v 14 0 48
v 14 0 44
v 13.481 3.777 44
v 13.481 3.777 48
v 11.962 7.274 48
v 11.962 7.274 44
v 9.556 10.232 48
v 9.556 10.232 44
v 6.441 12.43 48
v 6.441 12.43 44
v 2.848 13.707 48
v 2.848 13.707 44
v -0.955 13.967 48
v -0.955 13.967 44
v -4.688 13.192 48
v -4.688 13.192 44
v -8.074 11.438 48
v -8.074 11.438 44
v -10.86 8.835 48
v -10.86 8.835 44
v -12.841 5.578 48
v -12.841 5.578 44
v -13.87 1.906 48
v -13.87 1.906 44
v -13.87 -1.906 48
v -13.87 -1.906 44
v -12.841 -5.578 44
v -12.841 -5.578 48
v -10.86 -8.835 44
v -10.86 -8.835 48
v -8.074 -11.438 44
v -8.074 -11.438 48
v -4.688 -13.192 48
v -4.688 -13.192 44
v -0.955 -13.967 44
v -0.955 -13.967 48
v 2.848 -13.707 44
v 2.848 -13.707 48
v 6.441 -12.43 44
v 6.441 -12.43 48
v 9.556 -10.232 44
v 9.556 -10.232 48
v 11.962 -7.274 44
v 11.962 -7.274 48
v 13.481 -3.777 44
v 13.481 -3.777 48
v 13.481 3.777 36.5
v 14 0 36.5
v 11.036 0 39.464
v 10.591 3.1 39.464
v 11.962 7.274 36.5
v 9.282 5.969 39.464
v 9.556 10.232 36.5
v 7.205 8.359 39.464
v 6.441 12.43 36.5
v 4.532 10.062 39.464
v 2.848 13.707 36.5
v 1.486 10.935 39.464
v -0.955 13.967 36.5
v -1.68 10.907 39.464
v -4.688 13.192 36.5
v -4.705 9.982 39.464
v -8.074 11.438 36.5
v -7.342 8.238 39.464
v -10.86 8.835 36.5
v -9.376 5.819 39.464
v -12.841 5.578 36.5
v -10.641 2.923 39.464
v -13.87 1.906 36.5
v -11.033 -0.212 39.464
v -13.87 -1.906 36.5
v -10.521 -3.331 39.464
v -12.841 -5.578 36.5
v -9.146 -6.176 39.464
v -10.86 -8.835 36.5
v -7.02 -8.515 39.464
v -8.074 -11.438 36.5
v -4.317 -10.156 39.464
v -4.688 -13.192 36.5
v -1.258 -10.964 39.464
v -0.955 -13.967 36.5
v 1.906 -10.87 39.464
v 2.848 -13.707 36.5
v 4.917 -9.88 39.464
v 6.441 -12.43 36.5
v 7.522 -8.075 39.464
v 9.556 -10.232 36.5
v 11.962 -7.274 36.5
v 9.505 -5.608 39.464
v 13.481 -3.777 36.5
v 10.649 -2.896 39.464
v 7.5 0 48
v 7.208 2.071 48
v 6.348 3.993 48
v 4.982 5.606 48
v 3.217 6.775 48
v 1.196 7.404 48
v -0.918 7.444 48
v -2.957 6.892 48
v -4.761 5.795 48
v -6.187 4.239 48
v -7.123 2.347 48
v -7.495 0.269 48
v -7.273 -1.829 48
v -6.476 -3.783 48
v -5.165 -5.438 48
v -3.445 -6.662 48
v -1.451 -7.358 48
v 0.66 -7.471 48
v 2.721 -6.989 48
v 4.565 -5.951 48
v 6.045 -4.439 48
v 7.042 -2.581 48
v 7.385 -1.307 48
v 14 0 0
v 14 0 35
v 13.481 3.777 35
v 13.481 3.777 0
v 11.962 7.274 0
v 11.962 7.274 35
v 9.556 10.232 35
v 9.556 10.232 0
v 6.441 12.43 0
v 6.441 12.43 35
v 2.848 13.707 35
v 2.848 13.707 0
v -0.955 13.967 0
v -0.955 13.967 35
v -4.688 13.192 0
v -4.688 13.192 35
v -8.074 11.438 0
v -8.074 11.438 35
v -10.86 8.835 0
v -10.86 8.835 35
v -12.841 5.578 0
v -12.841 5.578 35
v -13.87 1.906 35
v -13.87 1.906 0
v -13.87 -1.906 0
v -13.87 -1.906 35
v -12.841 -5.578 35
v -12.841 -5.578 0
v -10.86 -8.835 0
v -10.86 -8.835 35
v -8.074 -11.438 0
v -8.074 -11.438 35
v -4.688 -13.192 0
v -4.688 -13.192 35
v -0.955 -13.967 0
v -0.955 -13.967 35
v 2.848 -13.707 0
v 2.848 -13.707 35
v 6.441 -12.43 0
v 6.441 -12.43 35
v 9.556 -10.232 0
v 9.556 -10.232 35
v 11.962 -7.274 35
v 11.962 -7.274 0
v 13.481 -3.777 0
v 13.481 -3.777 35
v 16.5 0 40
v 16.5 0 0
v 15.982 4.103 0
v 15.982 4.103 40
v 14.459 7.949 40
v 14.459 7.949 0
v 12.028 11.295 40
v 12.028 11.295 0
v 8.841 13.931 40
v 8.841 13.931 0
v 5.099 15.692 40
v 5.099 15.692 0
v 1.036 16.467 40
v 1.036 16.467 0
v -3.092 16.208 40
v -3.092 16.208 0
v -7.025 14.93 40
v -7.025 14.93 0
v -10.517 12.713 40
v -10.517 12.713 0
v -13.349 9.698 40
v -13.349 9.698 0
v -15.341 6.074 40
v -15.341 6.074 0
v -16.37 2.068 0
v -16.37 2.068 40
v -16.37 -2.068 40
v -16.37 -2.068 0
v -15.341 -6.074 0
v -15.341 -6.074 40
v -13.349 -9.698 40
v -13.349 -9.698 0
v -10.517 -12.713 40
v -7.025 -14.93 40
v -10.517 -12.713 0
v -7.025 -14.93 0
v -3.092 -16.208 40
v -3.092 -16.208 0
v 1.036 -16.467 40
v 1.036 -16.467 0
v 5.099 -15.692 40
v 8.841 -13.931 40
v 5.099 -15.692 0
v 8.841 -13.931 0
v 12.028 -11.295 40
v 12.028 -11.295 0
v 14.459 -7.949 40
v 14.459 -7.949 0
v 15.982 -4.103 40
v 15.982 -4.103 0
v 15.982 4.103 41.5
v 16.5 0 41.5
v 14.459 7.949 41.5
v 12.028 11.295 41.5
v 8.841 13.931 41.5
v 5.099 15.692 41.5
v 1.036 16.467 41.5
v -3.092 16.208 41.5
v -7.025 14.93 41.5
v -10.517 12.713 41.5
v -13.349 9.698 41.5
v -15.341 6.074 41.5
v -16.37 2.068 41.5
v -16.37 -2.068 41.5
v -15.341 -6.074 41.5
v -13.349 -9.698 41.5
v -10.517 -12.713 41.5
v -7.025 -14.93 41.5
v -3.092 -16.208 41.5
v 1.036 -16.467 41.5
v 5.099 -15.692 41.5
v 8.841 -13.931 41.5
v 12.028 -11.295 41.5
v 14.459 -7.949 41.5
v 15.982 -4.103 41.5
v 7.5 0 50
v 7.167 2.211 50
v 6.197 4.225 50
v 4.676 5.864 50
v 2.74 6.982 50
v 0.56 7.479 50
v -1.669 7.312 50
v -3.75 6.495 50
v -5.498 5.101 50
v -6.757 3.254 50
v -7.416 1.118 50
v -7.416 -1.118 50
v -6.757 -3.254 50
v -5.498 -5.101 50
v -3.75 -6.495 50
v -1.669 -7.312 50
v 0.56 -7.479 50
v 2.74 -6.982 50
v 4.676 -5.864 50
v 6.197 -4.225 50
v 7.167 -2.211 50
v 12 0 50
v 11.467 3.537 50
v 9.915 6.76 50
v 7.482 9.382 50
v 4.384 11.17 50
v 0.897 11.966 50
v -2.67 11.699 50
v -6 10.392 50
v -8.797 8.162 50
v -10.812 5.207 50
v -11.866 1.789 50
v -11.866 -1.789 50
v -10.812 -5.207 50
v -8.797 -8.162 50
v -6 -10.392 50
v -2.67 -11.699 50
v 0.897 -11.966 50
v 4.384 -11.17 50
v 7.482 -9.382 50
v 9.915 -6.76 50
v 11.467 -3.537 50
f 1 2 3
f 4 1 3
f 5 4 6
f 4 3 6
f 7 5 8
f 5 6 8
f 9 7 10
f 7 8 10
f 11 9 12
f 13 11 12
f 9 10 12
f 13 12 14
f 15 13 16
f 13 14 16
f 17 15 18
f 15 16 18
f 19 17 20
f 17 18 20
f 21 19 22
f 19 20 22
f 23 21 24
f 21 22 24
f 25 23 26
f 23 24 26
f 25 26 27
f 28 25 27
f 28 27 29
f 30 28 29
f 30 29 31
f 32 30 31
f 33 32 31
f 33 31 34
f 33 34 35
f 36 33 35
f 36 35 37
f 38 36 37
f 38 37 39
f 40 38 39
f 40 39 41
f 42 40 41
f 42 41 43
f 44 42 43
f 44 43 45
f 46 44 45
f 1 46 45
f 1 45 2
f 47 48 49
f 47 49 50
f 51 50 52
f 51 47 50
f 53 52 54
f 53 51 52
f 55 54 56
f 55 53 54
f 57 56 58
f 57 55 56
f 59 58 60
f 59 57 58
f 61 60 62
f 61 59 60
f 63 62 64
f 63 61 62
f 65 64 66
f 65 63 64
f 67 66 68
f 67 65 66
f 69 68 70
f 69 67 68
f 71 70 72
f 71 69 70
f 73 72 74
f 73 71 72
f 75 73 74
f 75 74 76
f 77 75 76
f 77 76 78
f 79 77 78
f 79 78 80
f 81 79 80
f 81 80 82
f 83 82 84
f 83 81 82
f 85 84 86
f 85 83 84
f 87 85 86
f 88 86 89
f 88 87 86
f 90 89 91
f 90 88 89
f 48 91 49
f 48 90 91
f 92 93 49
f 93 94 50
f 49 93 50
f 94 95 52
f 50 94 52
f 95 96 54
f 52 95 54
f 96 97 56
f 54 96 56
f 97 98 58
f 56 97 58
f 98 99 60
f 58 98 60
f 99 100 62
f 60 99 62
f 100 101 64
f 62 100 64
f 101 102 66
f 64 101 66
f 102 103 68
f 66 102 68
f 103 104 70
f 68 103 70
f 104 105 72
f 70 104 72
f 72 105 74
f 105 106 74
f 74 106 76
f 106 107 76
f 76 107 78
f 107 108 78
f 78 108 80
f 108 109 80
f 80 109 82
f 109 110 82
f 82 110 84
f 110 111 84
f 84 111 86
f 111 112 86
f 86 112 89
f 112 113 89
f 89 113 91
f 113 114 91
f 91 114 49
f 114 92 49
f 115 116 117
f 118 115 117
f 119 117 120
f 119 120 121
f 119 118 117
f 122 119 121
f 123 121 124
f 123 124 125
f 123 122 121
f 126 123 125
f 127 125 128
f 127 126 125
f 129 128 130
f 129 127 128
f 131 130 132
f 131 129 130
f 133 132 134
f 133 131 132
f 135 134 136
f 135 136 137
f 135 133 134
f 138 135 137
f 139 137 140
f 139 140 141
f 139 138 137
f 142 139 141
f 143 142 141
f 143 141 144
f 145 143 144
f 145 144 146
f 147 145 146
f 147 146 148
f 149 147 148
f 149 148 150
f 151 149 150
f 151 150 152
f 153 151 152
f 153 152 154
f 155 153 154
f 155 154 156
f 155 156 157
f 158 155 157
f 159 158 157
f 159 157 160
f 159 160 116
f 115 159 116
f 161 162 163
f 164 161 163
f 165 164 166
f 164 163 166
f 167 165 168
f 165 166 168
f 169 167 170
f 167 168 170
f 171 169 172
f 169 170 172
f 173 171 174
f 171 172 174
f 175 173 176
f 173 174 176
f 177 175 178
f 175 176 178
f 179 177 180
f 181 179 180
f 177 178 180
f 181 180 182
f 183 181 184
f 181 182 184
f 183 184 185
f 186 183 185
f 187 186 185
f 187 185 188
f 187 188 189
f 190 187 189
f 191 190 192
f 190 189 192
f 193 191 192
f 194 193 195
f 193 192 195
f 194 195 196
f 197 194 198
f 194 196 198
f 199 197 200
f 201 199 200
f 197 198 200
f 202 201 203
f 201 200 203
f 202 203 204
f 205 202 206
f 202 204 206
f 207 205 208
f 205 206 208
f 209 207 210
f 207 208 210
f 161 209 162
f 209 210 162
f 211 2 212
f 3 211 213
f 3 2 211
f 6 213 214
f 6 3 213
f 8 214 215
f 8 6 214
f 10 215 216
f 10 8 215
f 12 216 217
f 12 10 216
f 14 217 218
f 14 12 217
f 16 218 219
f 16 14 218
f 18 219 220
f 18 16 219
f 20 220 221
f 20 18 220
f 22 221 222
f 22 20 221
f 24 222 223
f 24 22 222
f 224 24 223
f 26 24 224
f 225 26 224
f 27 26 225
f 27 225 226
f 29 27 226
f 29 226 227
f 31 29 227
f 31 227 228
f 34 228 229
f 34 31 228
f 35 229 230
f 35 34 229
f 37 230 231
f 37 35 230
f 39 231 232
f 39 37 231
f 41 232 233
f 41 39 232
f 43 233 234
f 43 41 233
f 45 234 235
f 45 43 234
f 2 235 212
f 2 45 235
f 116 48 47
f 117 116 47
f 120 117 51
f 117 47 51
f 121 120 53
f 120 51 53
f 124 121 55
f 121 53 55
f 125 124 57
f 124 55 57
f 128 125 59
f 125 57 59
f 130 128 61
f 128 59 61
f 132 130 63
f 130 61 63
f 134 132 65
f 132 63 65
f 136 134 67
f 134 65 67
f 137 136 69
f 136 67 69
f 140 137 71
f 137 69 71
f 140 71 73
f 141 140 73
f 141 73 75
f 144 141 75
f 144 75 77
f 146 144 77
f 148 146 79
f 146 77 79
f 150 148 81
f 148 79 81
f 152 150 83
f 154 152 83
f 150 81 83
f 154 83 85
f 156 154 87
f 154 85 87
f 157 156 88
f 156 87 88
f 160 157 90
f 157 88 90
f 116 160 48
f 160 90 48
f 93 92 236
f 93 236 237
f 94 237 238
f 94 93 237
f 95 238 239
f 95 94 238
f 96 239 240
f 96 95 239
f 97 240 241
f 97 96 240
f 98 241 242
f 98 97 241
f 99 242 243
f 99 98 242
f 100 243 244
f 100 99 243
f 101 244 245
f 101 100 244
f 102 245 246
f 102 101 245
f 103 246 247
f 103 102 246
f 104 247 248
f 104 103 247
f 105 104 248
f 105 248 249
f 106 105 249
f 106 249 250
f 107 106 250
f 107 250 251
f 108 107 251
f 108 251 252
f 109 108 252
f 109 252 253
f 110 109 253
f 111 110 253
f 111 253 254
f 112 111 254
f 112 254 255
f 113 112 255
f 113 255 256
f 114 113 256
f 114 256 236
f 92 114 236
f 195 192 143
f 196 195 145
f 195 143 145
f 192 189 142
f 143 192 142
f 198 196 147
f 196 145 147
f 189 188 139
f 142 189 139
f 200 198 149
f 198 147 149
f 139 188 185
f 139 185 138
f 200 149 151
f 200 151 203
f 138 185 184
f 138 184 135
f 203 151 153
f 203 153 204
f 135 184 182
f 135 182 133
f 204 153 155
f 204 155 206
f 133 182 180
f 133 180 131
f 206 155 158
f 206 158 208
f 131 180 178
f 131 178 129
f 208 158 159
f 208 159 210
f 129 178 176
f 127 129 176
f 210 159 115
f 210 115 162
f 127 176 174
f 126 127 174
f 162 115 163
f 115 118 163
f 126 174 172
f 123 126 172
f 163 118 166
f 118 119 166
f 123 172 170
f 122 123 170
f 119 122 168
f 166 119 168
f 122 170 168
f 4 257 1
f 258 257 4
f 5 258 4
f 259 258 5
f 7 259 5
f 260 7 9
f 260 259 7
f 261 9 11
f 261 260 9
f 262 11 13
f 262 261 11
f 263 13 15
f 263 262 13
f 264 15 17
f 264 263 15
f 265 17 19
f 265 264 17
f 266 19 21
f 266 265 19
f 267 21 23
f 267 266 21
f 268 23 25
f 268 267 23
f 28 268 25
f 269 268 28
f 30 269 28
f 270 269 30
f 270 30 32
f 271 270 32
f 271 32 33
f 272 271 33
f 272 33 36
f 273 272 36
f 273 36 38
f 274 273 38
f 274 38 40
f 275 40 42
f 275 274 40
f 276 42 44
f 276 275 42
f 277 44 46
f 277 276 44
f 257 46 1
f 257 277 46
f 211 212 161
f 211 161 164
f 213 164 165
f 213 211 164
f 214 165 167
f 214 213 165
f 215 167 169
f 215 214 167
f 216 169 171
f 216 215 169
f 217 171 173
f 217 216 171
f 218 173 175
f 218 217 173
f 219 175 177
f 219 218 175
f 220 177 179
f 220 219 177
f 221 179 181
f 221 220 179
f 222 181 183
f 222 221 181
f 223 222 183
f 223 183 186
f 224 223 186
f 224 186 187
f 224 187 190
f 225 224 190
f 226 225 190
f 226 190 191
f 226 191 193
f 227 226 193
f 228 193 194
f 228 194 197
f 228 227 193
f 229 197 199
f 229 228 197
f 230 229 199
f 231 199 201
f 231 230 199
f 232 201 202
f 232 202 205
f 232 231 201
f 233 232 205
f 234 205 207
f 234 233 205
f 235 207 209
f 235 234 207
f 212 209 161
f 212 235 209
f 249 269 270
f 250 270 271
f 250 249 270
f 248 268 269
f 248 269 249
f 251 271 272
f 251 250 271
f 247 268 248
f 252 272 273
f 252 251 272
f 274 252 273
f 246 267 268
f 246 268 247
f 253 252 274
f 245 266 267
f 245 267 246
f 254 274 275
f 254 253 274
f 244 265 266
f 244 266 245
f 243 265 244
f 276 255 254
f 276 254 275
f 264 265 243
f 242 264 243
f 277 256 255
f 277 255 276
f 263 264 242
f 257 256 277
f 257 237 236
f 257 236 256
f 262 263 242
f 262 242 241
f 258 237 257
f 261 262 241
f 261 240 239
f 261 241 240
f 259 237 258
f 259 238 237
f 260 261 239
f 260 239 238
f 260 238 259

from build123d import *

# Parameters (mm, degrees)
F0_R          = 16.5
F0_R_2        = 14
F1_DEPTH      = 40
F2_R          = 14
F2_R_2        = 7.5
F3_DEPTH      = 10
F3_DEPTH_BACK = 5
F4_S5_R       = 16.5
F4_T6_DEPTH   = 27
F5_SIZE       = 2
F6_S5_R       = 14
F6_T6_DEPTH   = 24
F7_SIZE       = 5


# Not quite as in the source:
# - a fillet or chamfer that OpenCascade refuses, or shapes differently, is made with other operations: its cross-section is extruded or revolved along the edge and cut away or added


with BuildPart() as f1:
    # F0 (on Top) → F1 (new body)
    with BuildSketch(Plane.XY):
        Circle(F0_R)
        Circle(F0_R_2, mode=Mode.SUBTRACT)
    extrude(amount=F1_DEPTH)

    # F2 (on face) → F3 (join, two sides)
    with BuildSketch(Plane.XY.offset(40)) as f3_sk:
        Circle(F2_R)
        Circle(F2_R_2, mode=Mode.SUBTRACT)
    extrude(amount=F3_DEPTH)
    extrude(f3_sk.sketch, amount=-F3_DEPTH_BACK)

    # F4: chamfer of 4 on 1 edges, made by hand


with BuildPart() as f4_tool2:
    # F4_s3 → F4_t4 (revolve)
    with BuildSketch(Plane.XZ):
        Polygon((18, 40), (14, 44), (14, 40), align=None)
    revolve(axis=Axis((0, 0, 40), (0, 0, 1)))

    # F4_s5 → F4_t6 (intersect, symmetric)
    with BuildSketch(Plane.XY.offset(42)):
        Circle(F4_S5_R)
    extrude(amount=F4_T6_DEPTH, both=True, mode=Mode.INTERSECT)


with BuildPart() as f1_1:
    add(f1.part)

    # F4_t1: union F4_tool2
    add(f4_tool2.part)

    # F5
    f5_edges = [f1_1.edges().sort_by_distance(p)[0] for p in [
        (-14, 0, 50),
    ]]
    chamfer(f5_edges, length=F5_SIZE)

    # F6: chamfer of 8 on 1 edges, made by hand


with BuildPart() as f6_tool2:
    # F6_s3 → F6_t4 (revolve)
    with BuildSketch(Plane.XZ):
        Polygon((7.5, 43), (15.5, 35), (7.5, 35), align=None)
    revolve(axis=Axis((0, 0, 35), (0, 0, 1)))

    # F6_s5 → F6_t6 (intersect, symmetric)
    with BuildSketch(Plane.XY.offset(39)):
        Circle(F6_S5_R)
    extrude(amount=F6_T6_DEPTH, both=True, mode=Mode.INTERSECT)


with BuildPart() as f1_2:
    add(f1_1.part)

    # F6_t1: cut F6_tool2
    add(f6_tool2.part, mode=Mode.SUBTRACT)

    # F7
    f7_edges = [f1_2.edges().sort_by_distance(p)[0] for p in [
        (-7.5, 0, 43),
    ]]
    chamfer(f7_edges, length=F7_SIZE)


solid = f1_2.part
